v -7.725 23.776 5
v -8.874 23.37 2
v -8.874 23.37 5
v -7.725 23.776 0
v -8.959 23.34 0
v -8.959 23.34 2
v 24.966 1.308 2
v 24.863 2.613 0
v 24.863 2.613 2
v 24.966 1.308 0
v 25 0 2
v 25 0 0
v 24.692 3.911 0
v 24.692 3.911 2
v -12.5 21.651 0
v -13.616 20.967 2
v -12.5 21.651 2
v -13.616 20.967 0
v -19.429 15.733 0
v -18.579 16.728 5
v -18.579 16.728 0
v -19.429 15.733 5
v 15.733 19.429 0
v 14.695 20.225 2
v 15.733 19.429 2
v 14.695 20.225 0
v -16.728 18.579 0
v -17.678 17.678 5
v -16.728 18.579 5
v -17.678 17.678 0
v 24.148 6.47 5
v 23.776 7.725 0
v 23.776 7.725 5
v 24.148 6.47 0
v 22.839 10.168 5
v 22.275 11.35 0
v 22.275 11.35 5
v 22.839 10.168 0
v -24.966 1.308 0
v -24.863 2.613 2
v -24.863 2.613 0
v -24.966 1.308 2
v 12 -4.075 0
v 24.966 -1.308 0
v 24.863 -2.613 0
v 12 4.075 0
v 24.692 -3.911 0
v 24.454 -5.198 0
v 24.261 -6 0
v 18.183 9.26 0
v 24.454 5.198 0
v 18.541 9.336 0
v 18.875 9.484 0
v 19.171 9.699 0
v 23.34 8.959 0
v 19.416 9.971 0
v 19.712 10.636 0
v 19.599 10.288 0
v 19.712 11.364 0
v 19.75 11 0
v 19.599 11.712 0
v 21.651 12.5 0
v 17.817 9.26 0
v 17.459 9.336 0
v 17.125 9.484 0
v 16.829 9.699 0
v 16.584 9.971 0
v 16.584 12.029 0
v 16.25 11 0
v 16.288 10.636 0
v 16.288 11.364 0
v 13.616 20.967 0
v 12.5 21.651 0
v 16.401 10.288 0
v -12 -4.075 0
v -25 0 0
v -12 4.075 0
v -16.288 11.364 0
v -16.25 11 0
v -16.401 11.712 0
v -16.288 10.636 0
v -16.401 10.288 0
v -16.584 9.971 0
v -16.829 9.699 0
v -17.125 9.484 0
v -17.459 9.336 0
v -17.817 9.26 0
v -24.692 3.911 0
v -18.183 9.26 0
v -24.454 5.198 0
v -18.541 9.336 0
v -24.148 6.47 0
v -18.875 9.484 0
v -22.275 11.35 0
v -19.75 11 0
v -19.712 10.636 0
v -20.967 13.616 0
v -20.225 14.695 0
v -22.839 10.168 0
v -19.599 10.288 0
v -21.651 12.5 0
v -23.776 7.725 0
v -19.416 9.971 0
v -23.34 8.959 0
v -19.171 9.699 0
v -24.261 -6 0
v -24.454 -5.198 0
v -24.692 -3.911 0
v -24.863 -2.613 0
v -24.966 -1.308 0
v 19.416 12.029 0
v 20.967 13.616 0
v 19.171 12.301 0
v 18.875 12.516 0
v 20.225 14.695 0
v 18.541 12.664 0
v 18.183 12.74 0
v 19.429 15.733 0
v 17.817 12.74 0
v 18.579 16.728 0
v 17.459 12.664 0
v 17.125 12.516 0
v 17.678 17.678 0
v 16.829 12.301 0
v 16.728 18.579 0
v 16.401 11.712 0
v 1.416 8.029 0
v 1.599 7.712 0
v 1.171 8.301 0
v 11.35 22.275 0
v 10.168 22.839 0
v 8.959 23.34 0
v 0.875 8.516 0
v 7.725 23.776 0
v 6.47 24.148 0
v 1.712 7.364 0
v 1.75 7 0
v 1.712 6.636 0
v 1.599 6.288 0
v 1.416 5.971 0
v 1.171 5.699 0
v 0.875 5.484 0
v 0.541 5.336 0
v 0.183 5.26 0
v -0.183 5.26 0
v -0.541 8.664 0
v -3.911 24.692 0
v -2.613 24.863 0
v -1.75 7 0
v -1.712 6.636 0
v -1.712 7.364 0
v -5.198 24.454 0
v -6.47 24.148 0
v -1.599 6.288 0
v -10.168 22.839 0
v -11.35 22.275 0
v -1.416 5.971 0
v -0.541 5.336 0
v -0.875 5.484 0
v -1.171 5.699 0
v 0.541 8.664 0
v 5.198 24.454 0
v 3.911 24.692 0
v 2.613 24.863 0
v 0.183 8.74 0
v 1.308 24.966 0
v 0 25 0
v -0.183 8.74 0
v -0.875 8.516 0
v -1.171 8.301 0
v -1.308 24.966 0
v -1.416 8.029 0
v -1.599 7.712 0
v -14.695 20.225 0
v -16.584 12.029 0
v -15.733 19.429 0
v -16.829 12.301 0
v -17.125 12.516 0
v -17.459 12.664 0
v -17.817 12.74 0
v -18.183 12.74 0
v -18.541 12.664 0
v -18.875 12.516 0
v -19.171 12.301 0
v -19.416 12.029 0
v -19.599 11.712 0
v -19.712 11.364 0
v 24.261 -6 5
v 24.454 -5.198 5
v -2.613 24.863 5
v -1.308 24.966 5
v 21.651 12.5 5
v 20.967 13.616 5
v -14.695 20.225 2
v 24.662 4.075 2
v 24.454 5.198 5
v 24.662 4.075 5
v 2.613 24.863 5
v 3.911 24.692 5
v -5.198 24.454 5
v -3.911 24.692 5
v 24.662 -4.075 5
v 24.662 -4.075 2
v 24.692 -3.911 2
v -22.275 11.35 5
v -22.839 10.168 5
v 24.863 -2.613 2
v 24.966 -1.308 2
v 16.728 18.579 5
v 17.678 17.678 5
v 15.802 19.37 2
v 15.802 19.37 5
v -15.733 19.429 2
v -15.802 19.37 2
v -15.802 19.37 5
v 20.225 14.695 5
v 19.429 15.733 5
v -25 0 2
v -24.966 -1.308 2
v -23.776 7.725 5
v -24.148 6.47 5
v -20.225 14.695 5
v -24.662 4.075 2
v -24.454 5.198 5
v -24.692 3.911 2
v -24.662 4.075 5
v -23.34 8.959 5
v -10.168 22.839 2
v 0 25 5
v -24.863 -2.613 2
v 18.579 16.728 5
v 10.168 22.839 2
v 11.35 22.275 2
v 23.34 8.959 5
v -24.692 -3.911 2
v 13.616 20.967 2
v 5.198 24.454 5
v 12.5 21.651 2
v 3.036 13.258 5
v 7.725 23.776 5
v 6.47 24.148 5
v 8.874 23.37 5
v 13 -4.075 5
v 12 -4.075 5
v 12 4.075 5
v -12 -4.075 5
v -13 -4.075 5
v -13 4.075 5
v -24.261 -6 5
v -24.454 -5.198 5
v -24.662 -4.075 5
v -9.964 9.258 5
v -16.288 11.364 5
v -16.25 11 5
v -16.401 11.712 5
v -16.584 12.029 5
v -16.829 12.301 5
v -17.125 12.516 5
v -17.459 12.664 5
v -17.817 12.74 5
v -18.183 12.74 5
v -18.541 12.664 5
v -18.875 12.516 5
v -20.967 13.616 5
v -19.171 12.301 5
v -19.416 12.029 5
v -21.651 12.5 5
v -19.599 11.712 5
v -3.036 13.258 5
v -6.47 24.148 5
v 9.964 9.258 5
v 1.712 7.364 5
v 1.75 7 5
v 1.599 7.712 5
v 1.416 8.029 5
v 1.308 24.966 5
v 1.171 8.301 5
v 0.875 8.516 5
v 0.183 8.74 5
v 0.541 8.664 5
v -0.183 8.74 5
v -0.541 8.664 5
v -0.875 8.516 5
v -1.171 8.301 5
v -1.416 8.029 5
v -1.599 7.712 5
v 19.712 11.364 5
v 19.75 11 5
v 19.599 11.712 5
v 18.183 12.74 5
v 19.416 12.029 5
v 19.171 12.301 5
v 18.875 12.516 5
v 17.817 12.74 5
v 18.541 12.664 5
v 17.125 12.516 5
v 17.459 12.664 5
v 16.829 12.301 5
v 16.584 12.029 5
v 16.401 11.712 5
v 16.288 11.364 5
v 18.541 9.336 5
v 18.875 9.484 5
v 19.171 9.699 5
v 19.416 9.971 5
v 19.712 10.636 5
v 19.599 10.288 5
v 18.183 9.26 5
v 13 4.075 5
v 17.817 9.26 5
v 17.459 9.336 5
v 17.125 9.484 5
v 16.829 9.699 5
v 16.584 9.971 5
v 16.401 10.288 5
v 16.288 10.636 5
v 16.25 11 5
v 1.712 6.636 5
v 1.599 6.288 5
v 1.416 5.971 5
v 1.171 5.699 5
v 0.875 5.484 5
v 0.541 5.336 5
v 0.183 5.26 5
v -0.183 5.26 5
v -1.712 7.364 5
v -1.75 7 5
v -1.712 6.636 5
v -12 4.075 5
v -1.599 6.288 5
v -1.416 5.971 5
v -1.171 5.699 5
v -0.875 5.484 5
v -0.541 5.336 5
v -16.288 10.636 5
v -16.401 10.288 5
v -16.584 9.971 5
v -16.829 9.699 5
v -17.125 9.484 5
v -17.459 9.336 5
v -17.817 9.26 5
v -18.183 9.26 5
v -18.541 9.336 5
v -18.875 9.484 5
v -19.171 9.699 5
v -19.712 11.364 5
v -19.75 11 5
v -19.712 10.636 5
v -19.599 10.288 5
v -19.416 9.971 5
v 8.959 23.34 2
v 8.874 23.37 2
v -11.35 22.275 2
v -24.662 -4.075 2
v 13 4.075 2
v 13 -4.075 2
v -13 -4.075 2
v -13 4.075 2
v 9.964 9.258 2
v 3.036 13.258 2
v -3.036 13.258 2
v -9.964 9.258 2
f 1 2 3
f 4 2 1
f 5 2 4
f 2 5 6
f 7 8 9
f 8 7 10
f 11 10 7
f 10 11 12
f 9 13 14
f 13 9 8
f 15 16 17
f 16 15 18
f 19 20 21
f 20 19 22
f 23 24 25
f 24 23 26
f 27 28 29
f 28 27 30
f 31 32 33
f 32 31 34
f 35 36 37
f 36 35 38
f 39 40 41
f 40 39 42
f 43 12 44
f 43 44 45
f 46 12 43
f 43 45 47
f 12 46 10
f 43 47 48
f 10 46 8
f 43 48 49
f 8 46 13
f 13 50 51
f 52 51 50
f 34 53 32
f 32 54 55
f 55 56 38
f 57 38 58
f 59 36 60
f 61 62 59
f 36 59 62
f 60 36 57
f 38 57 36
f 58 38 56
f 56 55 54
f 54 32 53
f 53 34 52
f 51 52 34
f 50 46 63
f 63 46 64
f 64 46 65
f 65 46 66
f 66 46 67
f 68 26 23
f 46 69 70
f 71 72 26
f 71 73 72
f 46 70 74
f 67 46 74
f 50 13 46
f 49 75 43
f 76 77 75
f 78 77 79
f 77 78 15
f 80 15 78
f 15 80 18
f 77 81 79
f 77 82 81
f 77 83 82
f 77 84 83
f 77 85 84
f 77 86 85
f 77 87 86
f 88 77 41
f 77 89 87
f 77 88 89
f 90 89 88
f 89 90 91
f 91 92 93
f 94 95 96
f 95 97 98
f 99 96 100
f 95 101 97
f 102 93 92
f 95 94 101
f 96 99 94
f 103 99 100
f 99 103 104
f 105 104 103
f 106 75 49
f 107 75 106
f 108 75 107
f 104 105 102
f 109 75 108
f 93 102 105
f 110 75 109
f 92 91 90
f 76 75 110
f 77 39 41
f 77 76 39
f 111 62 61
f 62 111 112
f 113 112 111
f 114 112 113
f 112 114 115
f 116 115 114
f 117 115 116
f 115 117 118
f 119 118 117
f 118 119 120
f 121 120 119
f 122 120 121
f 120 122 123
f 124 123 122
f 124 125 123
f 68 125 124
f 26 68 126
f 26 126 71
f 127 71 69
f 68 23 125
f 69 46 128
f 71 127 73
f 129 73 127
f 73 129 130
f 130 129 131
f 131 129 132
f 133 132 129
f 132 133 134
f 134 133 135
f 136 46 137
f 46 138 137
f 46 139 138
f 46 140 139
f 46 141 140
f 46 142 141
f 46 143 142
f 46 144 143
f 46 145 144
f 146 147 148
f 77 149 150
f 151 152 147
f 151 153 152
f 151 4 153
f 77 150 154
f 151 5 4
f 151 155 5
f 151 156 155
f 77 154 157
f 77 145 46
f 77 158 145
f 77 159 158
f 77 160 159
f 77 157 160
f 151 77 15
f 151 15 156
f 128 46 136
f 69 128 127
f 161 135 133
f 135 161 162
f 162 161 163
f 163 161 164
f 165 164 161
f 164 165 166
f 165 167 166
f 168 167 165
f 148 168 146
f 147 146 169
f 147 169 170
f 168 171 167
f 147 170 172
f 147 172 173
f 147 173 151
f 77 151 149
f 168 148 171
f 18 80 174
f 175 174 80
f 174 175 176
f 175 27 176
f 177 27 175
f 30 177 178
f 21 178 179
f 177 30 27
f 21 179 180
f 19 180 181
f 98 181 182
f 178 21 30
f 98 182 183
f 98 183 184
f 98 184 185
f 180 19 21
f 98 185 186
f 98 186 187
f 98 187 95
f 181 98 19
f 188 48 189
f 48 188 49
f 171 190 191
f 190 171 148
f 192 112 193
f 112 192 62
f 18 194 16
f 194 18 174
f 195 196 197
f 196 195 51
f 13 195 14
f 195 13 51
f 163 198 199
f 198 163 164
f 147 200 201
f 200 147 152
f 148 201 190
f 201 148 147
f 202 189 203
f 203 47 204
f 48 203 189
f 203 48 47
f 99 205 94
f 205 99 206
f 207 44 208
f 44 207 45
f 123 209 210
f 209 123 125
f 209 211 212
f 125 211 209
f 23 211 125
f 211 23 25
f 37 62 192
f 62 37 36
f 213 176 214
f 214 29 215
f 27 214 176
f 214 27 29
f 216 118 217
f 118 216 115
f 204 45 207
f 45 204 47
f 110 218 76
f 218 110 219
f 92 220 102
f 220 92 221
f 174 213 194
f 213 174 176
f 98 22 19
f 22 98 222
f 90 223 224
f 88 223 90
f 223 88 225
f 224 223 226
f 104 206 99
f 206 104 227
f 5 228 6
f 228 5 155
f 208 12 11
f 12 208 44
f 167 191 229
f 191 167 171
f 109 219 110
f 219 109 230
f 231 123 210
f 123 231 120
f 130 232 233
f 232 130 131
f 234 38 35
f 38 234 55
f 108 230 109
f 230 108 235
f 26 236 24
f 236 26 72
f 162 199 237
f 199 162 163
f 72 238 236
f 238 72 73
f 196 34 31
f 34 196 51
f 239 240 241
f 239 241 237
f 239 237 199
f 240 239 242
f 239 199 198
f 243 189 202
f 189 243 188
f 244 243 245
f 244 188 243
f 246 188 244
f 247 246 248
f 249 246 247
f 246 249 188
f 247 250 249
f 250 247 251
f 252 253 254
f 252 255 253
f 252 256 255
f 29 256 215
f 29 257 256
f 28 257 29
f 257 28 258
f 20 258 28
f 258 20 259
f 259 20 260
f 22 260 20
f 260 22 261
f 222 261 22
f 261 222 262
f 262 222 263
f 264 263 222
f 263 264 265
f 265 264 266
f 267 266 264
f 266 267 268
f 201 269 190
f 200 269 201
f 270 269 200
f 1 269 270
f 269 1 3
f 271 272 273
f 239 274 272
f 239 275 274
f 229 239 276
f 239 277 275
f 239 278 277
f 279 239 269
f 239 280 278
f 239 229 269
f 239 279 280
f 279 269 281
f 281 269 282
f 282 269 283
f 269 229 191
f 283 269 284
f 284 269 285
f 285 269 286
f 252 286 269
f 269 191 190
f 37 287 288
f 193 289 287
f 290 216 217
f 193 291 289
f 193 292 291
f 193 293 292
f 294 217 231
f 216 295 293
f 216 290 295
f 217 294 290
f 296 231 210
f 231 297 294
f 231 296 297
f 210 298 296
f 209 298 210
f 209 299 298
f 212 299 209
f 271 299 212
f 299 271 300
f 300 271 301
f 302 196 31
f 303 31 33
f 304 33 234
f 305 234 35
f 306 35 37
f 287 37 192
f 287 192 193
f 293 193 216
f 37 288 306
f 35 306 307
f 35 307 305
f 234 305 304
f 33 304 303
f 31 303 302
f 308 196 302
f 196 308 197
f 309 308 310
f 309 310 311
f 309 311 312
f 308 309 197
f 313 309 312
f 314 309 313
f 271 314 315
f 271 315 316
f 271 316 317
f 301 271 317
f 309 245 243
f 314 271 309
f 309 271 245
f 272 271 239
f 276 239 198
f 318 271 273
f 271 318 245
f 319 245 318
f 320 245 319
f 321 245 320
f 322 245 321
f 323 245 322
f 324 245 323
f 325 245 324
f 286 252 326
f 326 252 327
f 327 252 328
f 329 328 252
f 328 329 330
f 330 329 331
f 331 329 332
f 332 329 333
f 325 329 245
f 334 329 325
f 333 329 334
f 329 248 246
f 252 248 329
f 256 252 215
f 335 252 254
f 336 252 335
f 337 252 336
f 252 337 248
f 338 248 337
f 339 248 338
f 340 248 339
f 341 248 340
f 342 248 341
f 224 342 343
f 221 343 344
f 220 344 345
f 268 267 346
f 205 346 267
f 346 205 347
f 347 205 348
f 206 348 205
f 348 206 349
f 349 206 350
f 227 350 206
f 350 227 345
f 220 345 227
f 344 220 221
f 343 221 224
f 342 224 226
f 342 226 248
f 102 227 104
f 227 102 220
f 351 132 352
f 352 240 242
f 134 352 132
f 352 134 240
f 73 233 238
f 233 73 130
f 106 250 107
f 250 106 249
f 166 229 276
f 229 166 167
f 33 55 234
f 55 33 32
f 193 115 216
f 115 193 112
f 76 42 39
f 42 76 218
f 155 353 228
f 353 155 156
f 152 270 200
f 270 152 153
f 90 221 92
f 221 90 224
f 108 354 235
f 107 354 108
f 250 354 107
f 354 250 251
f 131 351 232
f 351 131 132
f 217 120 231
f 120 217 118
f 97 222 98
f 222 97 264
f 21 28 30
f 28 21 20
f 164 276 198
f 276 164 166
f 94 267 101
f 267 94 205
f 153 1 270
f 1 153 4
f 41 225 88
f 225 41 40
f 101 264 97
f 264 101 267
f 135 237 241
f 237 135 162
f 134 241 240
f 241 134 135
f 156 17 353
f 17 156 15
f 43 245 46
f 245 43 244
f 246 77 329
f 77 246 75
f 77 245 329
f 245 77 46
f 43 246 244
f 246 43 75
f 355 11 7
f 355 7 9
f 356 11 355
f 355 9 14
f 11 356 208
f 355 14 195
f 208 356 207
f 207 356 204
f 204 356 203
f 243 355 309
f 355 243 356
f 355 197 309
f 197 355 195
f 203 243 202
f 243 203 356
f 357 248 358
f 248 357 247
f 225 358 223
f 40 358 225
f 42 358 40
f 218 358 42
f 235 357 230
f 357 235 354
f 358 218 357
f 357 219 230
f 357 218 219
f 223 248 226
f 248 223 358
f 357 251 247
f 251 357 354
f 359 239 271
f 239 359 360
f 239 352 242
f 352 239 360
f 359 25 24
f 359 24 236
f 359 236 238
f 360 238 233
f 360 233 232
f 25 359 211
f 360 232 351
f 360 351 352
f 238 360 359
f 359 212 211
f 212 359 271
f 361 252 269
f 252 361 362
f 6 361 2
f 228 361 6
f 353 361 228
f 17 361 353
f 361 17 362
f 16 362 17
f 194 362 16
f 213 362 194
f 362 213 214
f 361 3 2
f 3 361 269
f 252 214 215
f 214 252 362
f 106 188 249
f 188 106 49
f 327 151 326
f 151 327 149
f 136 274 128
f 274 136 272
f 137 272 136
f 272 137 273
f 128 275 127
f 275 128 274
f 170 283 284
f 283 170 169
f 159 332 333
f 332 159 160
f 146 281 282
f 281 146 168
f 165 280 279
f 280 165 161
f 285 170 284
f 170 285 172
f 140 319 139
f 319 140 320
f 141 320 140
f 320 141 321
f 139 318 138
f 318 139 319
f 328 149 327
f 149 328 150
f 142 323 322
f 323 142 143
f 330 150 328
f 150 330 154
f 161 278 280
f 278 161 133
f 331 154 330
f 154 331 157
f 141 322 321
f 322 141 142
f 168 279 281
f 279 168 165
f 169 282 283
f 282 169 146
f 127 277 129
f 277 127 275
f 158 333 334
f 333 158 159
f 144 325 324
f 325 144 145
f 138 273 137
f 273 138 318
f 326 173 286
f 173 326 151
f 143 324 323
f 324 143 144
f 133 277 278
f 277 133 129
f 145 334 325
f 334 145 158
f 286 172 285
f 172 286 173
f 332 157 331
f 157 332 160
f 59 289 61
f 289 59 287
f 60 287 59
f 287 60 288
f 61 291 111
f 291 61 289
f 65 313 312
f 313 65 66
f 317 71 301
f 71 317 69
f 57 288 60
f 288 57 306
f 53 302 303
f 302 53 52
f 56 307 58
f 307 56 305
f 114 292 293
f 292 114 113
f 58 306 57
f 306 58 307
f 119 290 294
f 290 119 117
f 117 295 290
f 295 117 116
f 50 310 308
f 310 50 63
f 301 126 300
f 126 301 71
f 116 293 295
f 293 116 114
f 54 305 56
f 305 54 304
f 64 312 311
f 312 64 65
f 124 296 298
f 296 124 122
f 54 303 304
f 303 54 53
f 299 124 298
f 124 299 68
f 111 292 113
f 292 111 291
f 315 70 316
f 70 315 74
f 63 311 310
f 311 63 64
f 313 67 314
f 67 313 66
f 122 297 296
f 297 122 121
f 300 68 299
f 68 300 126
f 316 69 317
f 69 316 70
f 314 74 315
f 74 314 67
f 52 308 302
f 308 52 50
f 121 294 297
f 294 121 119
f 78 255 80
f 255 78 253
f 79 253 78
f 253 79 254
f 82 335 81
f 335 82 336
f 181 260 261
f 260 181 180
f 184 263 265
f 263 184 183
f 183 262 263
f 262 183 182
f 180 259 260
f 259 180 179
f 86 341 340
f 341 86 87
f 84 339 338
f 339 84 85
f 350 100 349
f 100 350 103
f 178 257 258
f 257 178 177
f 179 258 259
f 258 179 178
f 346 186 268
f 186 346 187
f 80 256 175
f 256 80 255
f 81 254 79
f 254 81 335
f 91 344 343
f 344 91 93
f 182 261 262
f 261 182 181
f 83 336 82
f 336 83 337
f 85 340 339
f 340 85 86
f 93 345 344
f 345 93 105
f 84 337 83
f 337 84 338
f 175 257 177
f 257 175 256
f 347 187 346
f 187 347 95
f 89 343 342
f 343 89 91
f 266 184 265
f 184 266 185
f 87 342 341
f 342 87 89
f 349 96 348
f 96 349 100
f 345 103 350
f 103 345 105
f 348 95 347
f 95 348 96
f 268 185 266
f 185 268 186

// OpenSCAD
difference(){
cylinder(d=50,h=5,$fn=120);
cube([24,8.15,12],center=true);
translate([25,0,8])cube([24,8.15,12],center=true);
translate([-25,0,8])cube([24,8.15,12],center=true);
rotate([0,0,60])translate([25,0,8])
cube([24,8,12],center=true);
rotate([0,0,-60])translate([-25,0,8])
cube([24,8,12],center=true);
translate([0,-30,0])cube([54,48,12],center=true);
translate([0,7,-1])cylinder(d=3.5,h=10,$fn=30);
translate([18,11,-1])cylinder(d=3.5,h=10,$fn=30);
translate([-18,11,-1])cylinder(d=3.5,h=10,$fn=30);
}
